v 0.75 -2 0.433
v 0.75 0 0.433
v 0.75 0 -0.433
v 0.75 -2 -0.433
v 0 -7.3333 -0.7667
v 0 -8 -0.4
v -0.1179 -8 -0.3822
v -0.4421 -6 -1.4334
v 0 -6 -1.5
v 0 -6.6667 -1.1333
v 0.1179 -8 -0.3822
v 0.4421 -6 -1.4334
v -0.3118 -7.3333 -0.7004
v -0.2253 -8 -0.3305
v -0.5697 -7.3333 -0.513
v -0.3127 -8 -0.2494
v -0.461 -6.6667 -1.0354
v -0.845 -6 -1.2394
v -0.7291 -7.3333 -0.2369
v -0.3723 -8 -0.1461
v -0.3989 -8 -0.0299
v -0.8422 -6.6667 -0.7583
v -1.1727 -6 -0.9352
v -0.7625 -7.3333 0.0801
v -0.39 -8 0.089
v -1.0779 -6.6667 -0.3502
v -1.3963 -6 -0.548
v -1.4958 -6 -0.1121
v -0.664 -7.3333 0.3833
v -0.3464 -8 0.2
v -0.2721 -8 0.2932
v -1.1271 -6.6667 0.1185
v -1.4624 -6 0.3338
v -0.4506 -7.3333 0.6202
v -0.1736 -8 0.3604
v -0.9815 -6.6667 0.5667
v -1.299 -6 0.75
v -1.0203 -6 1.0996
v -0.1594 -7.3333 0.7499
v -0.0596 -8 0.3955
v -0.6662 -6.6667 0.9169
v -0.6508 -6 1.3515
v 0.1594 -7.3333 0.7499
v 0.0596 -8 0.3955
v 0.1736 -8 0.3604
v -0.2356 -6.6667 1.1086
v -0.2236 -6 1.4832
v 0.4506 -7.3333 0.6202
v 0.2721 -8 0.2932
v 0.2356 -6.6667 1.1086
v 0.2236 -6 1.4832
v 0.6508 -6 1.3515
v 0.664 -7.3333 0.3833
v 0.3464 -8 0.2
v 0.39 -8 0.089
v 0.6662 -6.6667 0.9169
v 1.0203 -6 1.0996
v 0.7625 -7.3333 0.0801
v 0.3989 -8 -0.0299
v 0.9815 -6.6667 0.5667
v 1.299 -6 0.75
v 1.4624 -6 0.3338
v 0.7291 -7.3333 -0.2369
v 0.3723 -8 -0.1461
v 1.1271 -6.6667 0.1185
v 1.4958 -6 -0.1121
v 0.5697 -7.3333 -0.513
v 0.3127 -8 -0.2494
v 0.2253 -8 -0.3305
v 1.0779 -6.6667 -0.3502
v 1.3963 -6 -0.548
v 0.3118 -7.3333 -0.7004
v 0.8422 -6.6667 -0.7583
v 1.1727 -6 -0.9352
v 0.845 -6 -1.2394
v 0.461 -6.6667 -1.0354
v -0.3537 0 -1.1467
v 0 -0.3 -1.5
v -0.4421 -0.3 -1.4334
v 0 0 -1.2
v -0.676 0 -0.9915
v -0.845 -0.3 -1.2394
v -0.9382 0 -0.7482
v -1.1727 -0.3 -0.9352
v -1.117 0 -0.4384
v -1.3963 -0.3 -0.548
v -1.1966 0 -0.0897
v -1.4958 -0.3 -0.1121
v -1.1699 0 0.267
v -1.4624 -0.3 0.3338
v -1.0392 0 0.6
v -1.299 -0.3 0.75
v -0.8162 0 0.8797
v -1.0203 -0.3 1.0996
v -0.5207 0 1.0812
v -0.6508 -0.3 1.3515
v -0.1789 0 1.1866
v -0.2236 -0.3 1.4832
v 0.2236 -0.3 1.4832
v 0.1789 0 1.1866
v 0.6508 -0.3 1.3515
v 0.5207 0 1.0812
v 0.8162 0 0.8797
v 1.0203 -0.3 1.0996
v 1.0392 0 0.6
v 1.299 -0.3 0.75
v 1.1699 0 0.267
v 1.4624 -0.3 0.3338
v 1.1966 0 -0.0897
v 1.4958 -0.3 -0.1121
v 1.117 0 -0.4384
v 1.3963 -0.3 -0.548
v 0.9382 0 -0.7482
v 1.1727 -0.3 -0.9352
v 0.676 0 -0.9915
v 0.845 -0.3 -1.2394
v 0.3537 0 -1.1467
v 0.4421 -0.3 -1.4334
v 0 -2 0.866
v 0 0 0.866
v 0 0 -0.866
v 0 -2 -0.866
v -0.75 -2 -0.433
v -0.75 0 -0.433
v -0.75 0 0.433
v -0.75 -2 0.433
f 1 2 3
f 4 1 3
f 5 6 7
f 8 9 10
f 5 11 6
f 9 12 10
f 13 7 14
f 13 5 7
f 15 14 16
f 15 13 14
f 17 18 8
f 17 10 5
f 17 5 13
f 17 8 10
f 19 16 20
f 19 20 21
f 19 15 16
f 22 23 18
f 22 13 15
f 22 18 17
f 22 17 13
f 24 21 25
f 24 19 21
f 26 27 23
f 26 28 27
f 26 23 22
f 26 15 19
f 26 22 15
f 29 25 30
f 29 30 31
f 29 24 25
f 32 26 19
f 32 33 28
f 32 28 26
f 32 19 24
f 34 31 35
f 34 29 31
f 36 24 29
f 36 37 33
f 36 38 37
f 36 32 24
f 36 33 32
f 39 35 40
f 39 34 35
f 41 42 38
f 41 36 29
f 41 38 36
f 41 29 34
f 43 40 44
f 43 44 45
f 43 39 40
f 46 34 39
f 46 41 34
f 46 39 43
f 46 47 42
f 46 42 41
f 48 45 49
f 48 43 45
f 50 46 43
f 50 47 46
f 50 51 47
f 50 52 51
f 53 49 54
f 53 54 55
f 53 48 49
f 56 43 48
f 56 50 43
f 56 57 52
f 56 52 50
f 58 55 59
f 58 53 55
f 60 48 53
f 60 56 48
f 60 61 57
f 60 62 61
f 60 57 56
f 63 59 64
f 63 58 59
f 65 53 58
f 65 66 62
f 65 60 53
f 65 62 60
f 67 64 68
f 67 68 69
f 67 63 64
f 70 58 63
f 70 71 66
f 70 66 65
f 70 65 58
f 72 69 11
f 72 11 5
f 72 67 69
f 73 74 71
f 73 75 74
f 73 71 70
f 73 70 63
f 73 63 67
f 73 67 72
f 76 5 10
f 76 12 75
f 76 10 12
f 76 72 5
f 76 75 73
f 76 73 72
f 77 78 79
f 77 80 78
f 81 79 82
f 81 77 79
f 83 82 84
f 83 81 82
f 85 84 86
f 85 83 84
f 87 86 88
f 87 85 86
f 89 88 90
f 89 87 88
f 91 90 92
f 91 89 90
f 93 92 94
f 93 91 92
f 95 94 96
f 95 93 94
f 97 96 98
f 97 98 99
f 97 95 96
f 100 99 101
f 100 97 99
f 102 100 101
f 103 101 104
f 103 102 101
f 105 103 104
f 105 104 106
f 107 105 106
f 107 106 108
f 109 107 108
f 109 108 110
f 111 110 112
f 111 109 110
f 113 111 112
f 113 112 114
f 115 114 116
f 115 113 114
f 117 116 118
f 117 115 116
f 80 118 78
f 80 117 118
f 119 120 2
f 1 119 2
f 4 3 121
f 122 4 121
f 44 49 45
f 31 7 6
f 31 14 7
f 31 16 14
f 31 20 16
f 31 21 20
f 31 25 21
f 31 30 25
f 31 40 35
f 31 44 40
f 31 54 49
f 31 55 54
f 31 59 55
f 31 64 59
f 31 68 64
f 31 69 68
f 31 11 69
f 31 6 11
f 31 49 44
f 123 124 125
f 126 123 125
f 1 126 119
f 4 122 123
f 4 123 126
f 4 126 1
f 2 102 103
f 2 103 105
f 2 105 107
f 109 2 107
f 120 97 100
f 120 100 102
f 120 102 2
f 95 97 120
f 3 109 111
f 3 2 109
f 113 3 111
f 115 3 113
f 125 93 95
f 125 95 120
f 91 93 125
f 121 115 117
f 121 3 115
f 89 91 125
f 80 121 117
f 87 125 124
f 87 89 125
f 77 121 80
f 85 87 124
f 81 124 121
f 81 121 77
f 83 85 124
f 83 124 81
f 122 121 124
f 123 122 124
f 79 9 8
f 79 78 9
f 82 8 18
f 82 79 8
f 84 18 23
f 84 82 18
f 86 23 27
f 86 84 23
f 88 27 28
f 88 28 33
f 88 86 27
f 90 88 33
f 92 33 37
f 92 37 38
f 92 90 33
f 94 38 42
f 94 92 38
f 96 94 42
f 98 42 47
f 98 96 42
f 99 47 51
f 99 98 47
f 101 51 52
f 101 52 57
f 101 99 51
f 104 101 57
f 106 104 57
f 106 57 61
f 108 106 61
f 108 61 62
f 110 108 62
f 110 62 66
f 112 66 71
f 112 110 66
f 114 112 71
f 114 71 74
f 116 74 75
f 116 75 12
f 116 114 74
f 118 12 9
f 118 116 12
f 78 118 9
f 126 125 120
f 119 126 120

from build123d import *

# Parameters (mm, degrees)
CUT_EXTRUDE1_DEPTH = 2


with BuildPart() as part:
    # Sketch1 → Base-Revolve (revolve)
    with BuildSketch(Plane.XY, mode=Mode.PRIVATE) as base_revolve_sk:
        Polygon((0, -8), (0.4, -8), (1.5, -6), (1.5, -0.3), (1.2, 0), (0, 0), align=None)
    revolve(base_revolve_sk.sketch.rotate(Axis((0, -34, 0), (0, 1, 0)), 90), axis=Axis((0, -34, 0), (0, 1, 0)))

    # Sketch2 → Cut-Extrude1 (cut)
    with BuildSketch(Plane(origin=(0, 0, 0), x_dir=(1, 0, 0), z_dir=(0, 1, 0))):
        Polygon((0.75, 0.433012702), (0, 0.866025404), (-0.75, 0.433012702), (-0.75, -0.433012702), (0, -0.866025404), (0.75, -0.433012702), align=None)
    extrude(amount=-CUT_EXTRUDE1_DEPTH, mode=Mode.SUBTRACT)


solid = part.part
